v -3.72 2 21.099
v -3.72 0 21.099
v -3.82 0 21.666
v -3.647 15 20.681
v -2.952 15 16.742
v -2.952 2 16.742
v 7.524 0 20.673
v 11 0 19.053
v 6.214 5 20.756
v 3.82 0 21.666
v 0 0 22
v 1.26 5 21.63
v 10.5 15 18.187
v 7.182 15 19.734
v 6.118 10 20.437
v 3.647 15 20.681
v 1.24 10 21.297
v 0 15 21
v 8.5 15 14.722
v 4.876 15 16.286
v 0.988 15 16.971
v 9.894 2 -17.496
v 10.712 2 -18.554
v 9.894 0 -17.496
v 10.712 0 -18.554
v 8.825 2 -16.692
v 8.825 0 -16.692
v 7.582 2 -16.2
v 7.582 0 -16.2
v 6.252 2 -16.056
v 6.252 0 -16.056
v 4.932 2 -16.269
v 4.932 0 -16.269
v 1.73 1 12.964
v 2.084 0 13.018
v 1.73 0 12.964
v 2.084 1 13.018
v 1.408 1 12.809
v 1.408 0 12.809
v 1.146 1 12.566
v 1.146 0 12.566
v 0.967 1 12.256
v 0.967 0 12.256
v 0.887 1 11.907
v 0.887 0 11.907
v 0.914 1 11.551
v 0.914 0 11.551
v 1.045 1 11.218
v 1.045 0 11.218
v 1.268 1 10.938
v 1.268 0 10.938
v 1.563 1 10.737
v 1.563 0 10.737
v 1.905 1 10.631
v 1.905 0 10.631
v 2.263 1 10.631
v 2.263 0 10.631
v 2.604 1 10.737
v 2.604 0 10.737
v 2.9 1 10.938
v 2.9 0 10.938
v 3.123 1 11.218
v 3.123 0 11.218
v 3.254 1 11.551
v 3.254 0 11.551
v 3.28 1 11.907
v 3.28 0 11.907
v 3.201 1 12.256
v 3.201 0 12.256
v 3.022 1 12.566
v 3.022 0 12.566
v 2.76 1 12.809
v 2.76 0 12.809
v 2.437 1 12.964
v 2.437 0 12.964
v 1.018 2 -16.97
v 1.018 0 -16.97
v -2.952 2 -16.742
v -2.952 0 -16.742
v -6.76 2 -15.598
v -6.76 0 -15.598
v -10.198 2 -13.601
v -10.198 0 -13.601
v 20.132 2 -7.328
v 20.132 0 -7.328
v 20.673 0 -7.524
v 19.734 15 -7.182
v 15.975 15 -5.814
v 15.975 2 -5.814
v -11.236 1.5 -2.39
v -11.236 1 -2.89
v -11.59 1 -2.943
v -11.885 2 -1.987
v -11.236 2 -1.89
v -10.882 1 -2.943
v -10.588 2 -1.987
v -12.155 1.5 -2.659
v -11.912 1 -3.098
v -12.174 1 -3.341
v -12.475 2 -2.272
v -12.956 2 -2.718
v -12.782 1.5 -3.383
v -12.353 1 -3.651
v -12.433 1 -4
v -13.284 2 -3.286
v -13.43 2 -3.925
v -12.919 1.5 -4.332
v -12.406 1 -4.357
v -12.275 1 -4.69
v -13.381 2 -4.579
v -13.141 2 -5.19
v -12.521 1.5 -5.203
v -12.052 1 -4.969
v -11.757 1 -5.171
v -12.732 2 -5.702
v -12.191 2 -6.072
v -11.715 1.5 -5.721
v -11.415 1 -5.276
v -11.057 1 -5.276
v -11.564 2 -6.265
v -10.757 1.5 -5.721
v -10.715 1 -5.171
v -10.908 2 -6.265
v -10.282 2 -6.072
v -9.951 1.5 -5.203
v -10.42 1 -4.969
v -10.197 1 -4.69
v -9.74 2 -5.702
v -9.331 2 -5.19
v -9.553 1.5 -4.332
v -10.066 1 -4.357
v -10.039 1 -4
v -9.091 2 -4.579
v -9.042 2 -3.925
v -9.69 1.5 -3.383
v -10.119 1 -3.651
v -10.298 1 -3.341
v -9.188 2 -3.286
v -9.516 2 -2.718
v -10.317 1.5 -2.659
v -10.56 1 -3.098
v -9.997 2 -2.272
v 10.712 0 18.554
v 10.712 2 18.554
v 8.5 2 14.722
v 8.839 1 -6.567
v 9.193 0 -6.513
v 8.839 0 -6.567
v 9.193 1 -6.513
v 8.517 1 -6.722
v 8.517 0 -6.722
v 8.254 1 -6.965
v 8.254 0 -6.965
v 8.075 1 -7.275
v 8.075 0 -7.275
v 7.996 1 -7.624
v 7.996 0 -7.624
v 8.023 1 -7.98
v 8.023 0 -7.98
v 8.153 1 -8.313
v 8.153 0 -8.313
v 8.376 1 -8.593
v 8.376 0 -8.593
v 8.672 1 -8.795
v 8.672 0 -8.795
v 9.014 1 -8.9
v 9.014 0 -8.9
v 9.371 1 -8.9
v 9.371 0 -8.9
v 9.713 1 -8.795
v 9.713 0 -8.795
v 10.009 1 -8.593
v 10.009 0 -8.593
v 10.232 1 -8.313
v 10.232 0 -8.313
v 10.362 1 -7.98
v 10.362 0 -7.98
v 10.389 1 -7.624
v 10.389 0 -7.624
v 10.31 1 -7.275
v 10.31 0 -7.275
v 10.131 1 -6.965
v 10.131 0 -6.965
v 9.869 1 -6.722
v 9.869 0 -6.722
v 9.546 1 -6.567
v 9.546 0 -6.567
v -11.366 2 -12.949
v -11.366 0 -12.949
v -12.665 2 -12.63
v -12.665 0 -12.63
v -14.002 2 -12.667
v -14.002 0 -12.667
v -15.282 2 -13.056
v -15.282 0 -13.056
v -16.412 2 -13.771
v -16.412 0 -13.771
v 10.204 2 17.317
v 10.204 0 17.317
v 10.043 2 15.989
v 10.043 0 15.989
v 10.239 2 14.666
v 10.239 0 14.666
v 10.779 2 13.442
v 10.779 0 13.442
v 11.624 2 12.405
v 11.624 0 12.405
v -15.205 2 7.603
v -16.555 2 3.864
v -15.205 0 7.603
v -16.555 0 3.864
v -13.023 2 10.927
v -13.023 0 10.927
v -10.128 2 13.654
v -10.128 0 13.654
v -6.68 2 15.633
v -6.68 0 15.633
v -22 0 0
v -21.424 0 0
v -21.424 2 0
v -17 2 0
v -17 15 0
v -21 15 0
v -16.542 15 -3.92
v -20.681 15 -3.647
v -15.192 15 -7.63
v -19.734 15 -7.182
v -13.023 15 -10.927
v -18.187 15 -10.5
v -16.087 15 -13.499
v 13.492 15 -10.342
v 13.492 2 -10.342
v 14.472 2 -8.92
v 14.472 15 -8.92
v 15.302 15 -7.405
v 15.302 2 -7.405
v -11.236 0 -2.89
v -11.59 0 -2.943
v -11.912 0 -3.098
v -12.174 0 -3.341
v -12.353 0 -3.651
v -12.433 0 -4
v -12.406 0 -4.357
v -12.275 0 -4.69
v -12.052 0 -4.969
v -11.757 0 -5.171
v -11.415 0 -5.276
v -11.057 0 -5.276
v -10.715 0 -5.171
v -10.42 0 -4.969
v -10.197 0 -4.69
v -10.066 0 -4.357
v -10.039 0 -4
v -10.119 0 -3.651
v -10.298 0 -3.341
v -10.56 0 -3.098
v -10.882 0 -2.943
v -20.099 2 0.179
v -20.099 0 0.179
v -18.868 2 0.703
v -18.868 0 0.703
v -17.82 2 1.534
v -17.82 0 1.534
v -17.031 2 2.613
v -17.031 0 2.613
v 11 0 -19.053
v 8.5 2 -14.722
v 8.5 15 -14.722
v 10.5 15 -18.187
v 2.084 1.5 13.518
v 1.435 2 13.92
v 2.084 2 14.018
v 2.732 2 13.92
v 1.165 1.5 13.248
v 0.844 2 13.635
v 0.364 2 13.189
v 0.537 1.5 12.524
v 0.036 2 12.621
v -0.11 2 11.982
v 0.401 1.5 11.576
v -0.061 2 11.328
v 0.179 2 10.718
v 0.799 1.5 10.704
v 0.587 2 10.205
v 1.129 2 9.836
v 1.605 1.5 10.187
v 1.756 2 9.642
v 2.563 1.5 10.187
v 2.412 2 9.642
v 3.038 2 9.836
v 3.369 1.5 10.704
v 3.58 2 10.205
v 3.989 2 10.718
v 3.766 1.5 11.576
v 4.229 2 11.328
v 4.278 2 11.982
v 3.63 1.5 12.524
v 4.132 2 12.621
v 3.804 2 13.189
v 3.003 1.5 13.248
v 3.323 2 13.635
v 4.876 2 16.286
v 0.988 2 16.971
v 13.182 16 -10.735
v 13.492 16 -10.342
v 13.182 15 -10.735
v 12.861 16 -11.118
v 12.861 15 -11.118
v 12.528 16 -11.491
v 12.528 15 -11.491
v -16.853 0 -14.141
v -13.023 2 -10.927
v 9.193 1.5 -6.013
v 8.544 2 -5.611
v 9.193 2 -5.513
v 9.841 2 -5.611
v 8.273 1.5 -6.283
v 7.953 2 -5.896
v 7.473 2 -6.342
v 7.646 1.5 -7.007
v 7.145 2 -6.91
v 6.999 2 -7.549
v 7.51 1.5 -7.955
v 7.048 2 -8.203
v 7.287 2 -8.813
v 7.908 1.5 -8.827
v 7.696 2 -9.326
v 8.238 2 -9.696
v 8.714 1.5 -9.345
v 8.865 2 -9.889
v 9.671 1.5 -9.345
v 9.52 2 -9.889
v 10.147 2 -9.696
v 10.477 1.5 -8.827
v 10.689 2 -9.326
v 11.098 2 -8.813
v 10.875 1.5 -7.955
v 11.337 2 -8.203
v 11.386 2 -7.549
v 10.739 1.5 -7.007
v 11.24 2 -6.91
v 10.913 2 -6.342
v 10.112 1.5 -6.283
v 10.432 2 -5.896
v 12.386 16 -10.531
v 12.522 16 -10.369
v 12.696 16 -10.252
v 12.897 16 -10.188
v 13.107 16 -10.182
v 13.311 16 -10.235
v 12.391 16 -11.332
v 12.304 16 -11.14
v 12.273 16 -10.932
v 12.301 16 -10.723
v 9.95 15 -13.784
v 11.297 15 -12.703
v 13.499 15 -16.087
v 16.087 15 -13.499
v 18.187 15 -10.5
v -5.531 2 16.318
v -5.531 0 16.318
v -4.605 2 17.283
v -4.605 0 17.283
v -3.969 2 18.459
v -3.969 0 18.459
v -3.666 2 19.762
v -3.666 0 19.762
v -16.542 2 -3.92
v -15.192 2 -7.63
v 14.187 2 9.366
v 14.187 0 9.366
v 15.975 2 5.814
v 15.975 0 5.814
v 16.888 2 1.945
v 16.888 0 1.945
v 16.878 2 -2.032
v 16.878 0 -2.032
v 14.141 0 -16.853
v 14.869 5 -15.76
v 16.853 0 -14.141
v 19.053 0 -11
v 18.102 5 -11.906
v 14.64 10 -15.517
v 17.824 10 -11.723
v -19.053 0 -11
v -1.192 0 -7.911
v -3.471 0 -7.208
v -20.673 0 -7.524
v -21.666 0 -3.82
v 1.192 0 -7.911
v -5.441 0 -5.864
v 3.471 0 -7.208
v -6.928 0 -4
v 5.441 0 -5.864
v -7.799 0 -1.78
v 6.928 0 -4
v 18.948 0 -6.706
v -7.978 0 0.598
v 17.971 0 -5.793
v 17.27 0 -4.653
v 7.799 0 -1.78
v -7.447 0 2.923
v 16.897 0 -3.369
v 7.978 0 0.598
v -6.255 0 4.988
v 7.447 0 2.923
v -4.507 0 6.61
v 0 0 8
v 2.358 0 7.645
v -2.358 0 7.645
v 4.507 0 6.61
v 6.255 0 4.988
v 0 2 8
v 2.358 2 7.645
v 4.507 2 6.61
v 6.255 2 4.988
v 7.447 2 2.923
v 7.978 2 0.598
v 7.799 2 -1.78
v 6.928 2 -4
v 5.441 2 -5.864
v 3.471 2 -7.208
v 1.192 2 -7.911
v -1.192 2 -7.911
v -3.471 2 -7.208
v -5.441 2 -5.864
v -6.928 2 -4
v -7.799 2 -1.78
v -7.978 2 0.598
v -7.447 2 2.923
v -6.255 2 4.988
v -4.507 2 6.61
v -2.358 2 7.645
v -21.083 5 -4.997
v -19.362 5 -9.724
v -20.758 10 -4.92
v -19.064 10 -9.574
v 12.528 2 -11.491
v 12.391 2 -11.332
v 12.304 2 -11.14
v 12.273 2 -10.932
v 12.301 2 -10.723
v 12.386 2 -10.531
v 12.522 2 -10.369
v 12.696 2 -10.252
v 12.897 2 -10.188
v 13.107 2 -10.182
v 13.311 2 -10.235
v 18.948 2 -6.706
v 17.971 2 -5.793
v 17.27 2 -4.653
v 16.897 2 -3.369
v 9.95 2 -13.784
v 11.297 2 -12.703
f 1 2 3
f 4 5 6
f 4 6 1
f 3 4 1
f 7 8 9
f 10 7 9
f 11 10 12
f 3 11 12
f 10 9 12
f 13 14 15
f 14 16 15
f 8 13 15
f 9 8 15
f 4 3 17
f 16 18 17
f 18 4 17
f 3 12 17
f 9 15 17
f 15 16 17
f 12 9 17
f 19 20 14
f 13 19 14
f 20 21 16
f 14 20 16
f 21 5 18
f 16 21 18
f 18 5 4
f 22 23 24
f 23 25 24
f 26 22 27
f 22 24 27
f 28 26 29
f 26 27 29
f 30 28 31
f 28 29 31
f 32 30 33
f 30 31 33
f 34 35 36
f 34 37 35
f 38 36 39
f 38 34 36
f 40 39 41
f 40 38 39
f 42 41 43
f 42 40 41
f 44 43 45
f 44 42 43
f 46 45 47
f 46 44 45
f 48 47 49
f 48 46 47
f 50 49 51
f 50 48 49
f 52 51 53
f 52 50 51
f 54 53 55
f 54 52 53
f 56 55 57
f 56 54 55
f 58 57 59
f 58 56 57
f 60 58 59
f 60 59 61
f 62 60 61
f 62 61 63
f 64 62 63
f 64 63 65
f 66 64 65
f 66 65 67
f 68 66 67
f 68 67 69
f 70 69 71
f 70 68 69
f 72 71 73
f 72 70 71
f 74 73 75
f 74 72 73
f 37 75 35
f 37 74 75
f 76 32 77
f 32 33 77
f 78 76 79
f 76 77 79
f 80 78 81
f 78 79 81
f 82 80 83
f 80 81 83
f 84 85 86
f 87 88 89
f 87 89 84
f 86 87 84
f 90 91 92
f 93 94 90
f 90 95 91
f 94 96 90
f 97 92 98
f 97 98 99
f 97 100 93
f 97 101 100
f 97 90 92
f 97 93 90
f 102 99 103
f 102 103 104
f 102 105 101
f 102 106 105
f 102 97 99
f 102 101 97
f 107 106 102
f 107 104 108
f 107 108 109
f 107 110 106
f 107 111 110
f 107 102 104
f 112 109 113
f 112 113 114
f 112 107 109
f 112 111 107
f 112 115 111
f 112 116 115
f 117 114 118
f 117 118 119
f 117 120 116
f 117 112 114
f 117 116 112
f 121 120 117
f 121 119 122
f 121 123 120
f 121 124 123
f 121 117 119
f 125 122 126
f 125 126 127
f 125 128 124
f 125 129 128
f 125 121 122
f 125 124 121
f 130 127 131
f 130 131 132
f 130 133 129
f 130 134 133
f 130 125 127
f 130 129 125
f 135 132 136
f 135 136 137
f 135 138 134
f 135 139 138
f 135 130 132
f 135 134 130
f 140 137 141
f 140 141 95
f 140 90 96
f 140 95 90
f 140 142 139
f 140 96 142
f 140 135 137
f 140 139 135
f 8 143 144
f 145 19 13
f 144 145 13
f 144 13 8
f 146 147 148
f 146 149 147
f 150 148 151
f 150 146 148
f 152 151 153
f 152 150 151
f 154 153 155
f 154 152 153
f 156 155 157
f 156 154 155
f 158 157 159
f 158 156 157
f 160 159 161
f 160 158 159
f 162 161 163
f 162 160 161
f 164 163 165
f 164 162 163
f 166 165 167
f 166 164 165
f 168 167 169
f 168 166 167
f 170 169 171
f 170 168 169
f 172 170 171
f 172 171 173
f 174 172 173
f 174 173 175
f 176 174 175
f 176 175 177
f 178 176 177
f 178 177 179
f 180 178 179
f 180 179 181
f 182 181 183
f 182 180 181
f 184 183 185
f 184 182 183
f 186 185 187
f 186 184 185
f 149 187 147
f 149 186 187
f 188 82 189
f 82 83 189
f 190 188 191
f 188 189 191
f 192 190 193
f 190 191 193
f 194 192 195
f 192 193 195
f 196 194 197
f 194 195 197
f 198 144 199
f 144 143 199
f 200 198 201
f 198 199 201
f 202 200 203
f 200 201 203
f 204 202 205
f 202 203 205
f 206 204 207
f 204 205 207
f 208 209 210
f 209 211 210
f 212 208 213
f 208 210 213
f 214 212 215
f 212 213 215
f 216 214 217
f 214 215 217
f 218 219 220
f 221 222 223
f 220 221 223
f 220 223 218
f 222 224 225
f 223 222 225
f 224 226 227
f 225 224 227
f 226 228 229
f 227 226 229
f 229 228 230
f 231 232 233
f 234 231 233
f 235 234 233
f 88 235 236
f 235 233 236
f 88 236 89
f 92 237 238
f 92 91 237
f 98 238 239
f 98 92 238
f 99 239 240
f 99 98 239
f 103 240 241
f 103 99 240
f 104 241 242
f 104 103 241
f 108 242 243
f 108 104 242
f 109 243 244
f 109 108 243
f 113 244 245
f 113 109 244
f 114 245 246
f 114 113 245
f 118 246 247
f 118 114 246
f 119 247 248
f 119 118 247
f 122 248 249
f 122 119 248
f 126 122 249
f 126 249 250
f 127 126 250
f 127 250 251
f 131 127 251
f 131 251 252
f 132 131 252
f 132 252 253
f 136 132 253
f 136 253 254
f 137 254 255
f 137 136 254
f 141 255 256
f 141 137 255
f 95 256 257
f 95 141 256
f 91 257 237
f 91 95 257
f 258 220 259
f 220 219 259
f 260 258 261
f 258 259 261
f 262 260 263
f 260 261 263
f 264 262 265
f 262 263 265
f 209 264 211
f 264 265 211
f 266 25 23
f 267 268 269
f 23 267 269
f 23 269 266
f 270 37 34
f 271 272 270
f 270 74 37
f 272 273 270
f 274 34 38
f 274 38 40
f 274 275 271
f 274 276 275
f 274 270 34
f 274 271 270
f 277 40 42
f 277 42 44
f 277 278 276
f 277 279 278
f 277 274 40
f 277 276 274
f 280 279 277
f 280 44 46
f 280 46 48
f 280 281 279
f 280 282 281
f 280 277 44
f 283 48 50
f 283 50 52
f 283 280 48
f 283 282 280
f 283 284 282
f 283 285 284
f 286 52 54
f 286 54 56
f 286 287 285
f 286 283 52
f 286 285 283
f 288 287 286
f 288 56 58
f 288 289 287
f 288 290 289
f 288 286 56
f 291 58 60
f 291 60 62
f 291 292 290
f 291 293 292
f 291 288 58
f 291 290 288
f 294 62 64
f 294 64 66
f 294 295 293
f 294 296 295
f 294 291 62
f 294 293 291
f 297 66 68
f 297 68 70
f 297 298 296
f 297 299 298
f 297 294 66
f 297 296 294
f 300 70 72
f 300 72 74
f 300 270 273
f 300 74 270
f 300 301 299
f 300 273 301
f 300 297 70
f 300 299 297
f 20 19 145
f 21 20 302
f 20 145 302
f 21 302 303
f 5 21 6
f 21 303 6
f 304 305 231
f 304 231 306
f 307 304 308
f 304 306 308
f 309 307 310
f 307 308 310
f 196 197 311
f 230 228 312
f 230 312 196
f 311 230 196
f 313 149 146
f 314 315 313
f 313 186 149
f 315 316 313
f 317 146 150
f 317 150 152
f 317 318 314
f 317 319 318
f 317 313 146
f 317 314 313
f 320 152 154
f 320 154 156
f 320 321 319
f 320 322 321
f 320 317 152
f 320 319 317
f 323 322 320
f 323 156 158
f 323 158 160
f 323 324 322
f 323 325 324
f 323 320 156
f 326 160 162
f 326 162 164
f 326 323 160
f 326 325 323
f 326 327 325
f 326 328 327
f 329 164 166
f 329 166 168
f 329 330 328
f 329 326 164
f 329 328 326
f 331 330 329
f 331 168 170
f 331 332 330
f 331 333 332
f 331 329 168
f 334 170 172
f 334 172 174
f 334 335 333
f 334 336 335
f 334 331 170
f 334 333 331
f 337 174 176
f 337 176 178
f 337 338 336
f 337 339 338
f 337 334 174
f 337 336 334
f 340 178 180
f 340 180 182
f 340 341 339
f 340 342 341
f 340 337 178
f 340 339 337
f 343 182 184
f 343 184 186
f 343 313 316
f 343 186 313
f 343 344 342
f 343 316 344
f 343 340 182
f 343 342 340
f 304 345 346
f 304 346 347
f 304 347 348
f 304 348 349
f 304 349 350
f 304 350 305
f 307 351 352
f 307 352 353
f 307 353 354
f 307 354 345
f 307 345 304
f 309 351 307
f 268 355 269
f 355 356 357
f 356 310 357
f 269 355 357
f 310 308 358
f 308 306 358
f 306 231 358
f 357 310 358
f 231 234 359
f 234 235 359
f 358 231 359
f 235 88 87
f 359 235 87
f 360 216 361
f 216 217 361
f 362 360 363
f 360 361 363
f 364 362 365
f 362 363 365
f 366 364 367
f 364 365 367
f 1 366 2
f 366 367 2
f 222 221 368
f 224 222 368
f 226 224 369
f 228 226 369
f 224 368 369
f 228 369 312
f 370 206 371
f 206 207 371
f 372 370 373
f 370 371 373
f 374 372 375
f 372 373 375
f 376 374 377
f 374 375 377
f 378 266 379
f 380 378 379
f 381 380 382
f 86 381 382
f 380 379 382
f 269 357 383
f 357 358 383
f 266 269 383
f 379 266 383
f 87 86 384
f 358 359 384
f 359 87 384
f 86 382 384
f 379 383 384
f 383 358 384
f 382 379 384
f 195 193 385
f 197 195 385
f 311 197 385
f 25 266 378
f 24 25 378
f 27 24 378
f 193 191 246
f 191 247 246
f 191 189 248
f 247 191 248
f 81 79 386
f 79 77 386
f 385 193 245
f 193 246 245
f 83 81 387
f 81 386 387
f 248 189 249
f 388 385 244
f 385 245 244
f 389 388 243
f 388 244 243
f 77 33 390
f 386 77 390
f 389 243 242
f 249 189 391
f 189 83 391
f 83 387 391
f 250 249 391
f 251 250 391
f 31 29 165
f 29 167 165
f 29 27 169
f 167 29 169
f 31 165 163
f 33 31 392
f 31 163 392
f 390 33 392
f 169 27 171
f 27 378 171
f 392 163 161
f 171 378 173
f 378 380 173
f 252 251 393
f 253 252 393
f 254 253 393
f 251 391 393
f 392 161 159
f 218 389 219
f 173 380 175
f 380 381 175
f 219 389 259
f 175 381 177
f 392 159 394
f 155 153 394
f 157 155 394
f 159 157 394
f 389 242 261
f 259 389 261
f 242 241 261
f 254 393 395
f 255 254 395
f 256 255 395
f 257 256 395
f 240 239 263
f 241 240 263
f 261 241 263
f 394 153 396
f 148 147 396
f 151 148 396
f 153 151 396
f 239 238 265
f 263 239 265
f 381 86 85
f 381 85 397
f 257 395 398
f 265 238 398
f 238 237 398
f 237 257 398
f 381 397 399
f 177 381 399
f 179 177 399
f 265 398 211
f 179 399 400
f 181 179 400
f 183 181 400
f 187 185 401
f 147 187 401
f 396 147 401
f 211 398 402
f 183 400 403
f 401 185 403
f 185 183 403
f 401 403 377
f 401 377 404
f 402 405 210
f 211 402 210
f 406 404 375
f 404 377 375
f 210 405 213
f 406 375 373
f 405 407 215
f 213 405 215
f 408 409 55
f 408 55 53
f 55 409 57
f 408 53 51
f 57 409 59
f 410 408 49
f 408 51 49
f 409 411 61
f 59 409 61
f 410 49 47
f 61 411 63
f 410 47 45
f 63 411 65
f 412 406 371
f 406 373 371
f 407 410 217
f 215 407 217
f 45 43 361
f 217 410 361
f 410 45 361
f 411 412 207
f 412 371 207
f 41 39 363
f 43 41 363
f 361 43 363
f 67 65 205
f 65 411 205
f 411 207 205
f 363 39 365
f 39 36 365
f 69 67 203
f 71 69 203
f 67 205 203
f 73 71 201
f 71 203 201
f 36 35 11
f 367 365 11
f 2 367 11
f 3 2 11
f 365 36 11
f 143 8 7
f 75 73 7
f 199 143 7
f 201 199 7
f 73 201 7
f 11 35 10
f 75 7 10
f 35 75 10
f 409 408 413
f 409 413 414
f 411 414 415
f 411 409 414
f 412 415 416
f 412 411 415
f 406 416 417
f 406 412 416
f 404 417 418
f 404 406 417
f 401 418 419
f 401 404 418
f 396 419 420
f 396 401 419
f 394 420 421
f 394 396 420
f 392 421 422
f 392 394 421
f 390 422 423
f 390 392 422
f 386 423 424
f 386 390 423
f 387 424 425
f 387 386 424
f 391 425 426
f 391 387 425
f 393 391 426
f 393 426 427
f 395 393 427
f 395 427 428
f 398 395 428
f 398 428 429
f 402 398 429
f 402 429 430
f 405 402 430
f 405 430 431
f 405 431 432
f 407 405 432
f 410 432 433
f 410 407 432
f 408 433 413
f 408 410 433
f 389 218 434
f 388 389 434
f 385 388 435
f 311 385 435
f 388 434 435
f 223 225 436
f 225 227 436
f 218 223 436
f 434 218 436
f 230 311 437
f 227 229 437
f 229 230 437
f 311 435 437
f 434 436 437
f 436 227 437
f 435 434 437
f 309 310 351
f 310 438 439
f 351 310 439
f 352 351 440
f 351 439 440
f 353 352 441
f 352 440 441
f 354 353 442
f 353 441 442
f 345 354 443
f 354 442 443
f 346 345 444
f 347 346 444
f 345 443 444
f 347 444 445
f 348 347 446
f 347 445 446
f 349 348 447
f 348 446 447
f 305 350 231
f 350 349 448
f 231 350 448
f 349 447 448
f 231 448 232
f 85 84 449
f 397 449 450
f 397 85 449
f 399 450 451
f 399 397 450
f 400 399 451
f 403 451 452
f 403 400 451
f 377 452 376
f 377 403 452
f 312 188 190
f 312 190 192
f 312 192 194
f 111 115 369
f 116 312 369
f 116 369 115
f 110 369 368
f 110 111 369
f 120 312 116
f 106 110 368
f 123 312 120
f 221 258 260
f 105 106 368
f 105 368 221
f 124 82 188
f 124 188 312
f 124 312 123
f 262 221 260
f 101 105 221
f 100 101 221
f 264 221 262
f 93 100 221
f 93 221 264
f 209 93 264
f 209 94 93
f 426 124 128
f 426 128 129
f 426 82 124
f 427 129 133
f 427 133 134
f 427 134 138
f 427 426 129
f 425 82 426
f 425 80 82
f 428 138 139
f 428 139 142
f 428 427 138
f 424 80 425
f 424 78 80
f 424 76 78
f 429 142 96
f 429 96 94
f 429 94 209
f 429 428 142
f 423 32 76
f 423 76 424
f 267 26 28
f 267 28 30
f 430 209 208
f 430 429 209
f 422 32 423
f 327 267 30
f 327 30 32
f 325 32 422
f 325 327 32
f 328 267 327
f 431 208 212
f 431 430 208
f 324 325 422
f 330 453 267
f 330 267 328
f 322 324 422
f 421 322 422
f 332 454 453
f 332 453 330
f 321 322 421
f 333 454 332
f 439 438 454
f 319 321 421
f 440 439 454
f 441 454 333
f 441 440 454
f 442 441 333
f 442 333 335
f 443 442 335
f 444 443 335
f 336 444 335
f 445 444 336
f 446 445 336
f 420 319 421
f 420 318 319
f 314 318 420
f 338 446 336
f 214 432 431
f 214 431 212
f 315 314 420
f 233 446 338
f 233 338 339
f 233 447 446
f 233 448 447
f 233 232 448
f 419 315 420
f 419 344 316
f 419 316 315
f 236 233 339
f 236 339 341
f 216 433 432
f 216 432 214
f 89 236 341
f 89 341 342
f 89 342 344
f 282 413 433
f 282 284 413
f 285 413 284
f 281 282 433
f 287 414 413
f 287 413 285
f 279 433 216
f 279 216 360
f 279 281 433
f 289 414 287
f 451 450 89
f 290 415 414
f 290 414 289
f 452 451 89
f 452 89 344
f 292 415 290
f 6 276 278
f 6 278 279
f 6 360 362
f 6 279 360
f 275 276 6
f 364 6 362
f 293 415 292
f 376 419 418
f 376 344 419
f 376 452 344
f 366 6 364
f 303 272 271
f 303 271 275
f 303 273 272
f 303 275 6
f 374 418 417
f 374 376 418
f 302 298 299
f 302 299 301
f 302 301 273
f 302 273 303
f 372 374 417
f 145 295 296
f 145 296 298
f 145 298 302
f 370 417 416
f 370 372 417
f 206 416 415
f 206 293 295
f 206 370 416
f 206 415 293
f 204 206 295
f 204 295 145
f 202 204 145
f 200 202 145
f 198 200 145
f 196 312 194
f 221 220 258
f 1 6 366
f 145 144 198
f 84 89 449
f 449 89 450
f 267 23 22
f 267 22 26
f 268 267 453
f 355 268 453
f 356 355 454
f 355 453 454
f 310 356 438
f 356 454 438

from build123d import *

# Parameters (mm, degrees)
SKETCH1_R                                    = 17
SKETCH1_R_2                                  = 8
BOSS_EXTRUDE4_DEPTH                          = 2
REVOLVE2_ANGLE                               = 40
CIRPATTERN1_COUNT                            = 3
FILLET1_R                                    = 5
CSK_FOR_M2_COUNTERSUNK_FLAT_HEAD_SCR_2_COUNT = 2
CSK_FOR_M2_COUNTERSUNK_FLAT_HEAD_SCR_2_PITCH = 20.784609691
CSK_FOR_M2_COUNTERSUNK_FLAT_HEAD_SCR_3_COUNT = 2
CSK_FOR_M2_COUNTERSUNK_FLAT_HEAD_SCR_3_PITCH = 20.747553677
BOSS_EXTRUDE6_DEPTH                          = 14


with BuildPart() as part:
    # Sketch1 → Boss-Extrude4 (new body)
    with BuildSketch(Plane(origin=(0, 0, 0), x_dir=(1, 0, 0), z_dir=(0, 1, 0))):
        with Locations(Location((0, 0, 0), (0, 0, 270))):
            Circle(SKETCH1_R)
        with Locations(Location((0, 0, 0), (0, 0, 270))):
            Circle(SKETCH1_R_2, mode=Mode.SUBTRACT)
    extrude(amount=BOSS_EXTRUDE4_DEPTH)

    # Sketch5 → Revolve2 (revolve)
    with BuildSketch(Plane.XY):
        Polygon((-17, 0), (-22, 0), (-21, 15), (-17, 15), align=None)
    revolve2 = revolve(axis=Axis((0, 9.813682869, 0), (0, -1, 0)), revolution_arc=REVOLVE2_ANGLE)

    # CirPattern1: Revolve2 ×3 about axis
    cirpattern1_axis = Axis((0, 0, 0), (0, 1, 0))
    for i in range(1, CIRPATTERN1_COUNT):
        add(revolve2.rotate(cirpattern1_axis, i * 360 / CIRPATTERN1_COUNT))

    # Fillet1
    fillet1_edges = [part.edges().sort_by_distance(p)[0] for p in [
        (-13.022755533, 1, -10.927389365),
        (-17, 1, 0),
        (-2.95201902, 1, 16.741731801),
        (8.5, 1, 14.722431864),
        (15.974774553, 1, -5.814342437),
        (8.5, 1, -14.722431864),
    ]]
    fillet(fillet1_edges, radius=FILLET1_R)

    # Sketch13 → CSK for M2 Countersunk Flat Head Screw1 (revolve, cut)
    with BuildSketch(Plane(origin=(2.083778132, 2, 11.817693036), x_dir=(0, 0, 1), z_dir=(1, 0, 0))):
        Polygon((0, 0), (0, 2), (1.2, 2), (1.2, 1), (2.2, 0), align=None)
    csk_for_m2_countersunk_flat_head_screw1 = revolve(axis=Axis((2.083778132, 8.35, 11.817693036), (0, -1, 0)), mode=Mode.SUBTRACT)

    # CSK for M2 Countersunk Flat Head Scr 2: CSK for M2 Countersunk Flat Head Screw1 ×2
    with Locations(*[Vector(0.3420201433256633, 0, -0.9396926207859104) * (i * CSK_FOR_M2_COUNTERSUNK_FLAT_HEAD_SCR_2_PITCH) for i in range(1, CSK_FOR_M2_COUNTERSUNK_FLAT_HEAD_SCR_2_COUNT)]):
        add(csk_for_m2_countersunk_flat_head_screw1, mode=Mode.SUBTRACT)

    # CSK for M2 Countersunk Flat Head Scr 3: CSK for M2 Countersunk Flat Head Screw1 ×2
    with Locations(*[Vector(-0.6419971087705412, 0, -0.7667070577021357) * (i * CSK_FOR_M2_COUNTERSUNK_FLAT_HEAD_SCR_3_PITCH) for i in range(1, CSK_FOR_M2_COUNTERSUNK_FLAT_HEAD_SCR_3_COUNT)]):
        add(csk_for_m2_countersunk_flat_head_screw1, mode=Mode.SUBTRACT)

    # Sketch24 → Boss-Extrude6 (add)
    with BuildSketch(Plane(origin=(0, 2, 0), x_dir=(1, 0, 0), z_dir=(0, 1, 0))):
        with BuildLine():
            ThreePointArc((12.528097784, 11.491160338), (12.448209945, 10.445288373), (13.492065142, 10.342348776))
            ThreePointArc((13.492065142, 10.342348776), (13.022755533, 10.927389365), (12.528097784, 11.491160338))
        make_face()
    extrude(amount=BOSS_EXTRUDE6_DEPTH)


solid = part.part
